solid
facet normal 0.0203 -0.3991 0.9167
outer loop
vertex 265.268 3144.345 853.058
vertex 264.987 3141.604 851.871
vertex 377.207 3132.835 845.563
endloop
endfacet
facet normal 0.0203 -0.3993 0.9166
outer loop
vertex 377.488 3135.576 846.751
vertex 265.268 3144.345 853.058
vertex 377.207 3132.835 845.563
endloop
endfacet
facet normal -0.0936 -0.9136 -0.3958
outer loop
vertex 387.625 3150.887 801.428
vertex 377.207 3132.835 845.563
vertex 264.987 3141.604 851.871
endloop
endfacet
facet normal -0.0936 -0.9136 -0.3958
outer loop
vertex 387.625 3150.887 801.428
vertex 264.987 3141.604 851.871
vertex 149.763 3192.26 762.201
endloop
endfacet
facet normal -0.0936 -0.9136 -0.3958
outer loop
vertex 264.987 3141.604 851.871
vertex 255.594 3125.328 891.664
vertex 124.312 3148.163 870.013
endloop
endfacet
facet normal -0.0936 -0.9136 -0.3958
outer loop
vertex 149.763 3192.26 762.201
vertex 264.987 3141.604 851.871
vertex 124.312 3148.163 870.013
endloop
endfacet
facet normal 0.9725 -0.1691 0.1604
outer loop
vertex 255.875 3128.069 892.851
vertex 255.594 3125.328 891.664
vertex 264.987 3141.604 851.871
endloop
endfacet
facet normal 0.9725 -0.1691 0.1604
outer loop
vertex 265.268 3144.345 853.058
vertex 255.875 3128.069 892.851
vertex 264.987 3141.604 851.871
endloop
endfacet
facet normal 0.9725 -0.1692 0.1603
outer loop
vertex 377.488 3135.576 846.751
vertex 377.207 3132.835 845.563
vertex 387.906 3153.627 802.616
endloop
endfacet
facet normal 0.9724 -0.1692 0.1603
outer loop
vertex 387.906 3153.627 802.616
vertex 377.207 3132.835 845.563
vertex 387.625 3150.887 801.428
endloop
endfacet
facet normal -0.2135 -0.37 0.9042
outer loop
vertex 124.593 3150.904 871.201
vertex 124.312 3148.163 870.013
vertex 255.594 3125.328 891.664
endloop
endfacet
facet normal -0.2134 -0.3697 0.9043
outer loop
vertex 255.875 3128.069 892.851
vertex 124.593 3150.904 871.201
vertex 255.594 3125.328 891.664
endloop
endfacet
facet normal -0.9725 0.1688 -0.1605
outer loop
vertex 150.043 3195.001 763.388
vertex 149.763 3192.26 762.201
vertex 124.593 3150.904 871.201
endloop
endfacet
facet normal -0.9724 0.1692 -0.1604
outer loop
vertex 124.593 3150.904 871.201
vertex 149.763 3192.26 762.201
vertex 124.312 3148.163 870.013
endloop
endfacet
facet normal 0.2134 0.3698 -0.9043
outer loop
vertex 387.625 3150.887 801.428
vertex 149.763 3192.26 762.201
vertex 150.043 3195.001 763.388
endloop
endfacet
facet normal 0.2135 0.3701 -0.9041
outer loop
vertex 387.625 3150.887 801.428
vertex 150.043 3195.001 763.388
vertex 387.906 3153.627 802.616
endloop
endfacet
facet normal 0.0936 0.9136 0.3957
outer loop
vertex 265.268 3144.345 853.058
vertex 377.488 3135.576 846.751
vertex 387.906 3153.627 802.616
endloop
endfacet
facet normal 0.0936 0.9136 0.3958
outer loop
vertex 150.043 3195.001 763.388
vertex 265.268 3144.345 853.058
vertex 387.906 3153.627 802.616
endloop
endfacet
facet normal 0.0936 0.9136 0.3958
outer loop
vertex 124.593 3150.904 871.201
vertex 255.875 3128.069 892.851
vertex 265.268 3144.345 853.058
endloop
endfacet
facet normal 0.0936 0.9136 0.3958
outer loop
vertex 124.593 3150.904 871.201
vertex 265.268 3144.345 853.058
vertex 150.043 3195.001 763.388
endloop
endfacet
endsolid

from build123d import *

# Parameters (mm, degrees)
BOSS_EXTRUDE1_DEPTH = 3


with BuildPart() as part:
    # Sketch1 → Boss-Extrude1 (new body)
    with BuildSketch(Plane(origin=(270.562015017, 2929.868417667, 1339.312972046), x_dir=(0.933919841, -0.218343191, 0.283054733), z_dir=(-0.093635076, -0.913565758, -0.395765181))):
        Polygon((-317.0861634, -434.442381086), (-183.365674706, -452.985058966), (-189.410130107, -496.574638387), (-84.476991235, -537.792492394), (-91.181057549, -586.138854741), (-199.742283926, -571.084947366), (-333.462772622, -552.542269486), align=None)
    extrude(amount=-BOSS_EXTRUDE1_DEPTH)


solid = part.part
